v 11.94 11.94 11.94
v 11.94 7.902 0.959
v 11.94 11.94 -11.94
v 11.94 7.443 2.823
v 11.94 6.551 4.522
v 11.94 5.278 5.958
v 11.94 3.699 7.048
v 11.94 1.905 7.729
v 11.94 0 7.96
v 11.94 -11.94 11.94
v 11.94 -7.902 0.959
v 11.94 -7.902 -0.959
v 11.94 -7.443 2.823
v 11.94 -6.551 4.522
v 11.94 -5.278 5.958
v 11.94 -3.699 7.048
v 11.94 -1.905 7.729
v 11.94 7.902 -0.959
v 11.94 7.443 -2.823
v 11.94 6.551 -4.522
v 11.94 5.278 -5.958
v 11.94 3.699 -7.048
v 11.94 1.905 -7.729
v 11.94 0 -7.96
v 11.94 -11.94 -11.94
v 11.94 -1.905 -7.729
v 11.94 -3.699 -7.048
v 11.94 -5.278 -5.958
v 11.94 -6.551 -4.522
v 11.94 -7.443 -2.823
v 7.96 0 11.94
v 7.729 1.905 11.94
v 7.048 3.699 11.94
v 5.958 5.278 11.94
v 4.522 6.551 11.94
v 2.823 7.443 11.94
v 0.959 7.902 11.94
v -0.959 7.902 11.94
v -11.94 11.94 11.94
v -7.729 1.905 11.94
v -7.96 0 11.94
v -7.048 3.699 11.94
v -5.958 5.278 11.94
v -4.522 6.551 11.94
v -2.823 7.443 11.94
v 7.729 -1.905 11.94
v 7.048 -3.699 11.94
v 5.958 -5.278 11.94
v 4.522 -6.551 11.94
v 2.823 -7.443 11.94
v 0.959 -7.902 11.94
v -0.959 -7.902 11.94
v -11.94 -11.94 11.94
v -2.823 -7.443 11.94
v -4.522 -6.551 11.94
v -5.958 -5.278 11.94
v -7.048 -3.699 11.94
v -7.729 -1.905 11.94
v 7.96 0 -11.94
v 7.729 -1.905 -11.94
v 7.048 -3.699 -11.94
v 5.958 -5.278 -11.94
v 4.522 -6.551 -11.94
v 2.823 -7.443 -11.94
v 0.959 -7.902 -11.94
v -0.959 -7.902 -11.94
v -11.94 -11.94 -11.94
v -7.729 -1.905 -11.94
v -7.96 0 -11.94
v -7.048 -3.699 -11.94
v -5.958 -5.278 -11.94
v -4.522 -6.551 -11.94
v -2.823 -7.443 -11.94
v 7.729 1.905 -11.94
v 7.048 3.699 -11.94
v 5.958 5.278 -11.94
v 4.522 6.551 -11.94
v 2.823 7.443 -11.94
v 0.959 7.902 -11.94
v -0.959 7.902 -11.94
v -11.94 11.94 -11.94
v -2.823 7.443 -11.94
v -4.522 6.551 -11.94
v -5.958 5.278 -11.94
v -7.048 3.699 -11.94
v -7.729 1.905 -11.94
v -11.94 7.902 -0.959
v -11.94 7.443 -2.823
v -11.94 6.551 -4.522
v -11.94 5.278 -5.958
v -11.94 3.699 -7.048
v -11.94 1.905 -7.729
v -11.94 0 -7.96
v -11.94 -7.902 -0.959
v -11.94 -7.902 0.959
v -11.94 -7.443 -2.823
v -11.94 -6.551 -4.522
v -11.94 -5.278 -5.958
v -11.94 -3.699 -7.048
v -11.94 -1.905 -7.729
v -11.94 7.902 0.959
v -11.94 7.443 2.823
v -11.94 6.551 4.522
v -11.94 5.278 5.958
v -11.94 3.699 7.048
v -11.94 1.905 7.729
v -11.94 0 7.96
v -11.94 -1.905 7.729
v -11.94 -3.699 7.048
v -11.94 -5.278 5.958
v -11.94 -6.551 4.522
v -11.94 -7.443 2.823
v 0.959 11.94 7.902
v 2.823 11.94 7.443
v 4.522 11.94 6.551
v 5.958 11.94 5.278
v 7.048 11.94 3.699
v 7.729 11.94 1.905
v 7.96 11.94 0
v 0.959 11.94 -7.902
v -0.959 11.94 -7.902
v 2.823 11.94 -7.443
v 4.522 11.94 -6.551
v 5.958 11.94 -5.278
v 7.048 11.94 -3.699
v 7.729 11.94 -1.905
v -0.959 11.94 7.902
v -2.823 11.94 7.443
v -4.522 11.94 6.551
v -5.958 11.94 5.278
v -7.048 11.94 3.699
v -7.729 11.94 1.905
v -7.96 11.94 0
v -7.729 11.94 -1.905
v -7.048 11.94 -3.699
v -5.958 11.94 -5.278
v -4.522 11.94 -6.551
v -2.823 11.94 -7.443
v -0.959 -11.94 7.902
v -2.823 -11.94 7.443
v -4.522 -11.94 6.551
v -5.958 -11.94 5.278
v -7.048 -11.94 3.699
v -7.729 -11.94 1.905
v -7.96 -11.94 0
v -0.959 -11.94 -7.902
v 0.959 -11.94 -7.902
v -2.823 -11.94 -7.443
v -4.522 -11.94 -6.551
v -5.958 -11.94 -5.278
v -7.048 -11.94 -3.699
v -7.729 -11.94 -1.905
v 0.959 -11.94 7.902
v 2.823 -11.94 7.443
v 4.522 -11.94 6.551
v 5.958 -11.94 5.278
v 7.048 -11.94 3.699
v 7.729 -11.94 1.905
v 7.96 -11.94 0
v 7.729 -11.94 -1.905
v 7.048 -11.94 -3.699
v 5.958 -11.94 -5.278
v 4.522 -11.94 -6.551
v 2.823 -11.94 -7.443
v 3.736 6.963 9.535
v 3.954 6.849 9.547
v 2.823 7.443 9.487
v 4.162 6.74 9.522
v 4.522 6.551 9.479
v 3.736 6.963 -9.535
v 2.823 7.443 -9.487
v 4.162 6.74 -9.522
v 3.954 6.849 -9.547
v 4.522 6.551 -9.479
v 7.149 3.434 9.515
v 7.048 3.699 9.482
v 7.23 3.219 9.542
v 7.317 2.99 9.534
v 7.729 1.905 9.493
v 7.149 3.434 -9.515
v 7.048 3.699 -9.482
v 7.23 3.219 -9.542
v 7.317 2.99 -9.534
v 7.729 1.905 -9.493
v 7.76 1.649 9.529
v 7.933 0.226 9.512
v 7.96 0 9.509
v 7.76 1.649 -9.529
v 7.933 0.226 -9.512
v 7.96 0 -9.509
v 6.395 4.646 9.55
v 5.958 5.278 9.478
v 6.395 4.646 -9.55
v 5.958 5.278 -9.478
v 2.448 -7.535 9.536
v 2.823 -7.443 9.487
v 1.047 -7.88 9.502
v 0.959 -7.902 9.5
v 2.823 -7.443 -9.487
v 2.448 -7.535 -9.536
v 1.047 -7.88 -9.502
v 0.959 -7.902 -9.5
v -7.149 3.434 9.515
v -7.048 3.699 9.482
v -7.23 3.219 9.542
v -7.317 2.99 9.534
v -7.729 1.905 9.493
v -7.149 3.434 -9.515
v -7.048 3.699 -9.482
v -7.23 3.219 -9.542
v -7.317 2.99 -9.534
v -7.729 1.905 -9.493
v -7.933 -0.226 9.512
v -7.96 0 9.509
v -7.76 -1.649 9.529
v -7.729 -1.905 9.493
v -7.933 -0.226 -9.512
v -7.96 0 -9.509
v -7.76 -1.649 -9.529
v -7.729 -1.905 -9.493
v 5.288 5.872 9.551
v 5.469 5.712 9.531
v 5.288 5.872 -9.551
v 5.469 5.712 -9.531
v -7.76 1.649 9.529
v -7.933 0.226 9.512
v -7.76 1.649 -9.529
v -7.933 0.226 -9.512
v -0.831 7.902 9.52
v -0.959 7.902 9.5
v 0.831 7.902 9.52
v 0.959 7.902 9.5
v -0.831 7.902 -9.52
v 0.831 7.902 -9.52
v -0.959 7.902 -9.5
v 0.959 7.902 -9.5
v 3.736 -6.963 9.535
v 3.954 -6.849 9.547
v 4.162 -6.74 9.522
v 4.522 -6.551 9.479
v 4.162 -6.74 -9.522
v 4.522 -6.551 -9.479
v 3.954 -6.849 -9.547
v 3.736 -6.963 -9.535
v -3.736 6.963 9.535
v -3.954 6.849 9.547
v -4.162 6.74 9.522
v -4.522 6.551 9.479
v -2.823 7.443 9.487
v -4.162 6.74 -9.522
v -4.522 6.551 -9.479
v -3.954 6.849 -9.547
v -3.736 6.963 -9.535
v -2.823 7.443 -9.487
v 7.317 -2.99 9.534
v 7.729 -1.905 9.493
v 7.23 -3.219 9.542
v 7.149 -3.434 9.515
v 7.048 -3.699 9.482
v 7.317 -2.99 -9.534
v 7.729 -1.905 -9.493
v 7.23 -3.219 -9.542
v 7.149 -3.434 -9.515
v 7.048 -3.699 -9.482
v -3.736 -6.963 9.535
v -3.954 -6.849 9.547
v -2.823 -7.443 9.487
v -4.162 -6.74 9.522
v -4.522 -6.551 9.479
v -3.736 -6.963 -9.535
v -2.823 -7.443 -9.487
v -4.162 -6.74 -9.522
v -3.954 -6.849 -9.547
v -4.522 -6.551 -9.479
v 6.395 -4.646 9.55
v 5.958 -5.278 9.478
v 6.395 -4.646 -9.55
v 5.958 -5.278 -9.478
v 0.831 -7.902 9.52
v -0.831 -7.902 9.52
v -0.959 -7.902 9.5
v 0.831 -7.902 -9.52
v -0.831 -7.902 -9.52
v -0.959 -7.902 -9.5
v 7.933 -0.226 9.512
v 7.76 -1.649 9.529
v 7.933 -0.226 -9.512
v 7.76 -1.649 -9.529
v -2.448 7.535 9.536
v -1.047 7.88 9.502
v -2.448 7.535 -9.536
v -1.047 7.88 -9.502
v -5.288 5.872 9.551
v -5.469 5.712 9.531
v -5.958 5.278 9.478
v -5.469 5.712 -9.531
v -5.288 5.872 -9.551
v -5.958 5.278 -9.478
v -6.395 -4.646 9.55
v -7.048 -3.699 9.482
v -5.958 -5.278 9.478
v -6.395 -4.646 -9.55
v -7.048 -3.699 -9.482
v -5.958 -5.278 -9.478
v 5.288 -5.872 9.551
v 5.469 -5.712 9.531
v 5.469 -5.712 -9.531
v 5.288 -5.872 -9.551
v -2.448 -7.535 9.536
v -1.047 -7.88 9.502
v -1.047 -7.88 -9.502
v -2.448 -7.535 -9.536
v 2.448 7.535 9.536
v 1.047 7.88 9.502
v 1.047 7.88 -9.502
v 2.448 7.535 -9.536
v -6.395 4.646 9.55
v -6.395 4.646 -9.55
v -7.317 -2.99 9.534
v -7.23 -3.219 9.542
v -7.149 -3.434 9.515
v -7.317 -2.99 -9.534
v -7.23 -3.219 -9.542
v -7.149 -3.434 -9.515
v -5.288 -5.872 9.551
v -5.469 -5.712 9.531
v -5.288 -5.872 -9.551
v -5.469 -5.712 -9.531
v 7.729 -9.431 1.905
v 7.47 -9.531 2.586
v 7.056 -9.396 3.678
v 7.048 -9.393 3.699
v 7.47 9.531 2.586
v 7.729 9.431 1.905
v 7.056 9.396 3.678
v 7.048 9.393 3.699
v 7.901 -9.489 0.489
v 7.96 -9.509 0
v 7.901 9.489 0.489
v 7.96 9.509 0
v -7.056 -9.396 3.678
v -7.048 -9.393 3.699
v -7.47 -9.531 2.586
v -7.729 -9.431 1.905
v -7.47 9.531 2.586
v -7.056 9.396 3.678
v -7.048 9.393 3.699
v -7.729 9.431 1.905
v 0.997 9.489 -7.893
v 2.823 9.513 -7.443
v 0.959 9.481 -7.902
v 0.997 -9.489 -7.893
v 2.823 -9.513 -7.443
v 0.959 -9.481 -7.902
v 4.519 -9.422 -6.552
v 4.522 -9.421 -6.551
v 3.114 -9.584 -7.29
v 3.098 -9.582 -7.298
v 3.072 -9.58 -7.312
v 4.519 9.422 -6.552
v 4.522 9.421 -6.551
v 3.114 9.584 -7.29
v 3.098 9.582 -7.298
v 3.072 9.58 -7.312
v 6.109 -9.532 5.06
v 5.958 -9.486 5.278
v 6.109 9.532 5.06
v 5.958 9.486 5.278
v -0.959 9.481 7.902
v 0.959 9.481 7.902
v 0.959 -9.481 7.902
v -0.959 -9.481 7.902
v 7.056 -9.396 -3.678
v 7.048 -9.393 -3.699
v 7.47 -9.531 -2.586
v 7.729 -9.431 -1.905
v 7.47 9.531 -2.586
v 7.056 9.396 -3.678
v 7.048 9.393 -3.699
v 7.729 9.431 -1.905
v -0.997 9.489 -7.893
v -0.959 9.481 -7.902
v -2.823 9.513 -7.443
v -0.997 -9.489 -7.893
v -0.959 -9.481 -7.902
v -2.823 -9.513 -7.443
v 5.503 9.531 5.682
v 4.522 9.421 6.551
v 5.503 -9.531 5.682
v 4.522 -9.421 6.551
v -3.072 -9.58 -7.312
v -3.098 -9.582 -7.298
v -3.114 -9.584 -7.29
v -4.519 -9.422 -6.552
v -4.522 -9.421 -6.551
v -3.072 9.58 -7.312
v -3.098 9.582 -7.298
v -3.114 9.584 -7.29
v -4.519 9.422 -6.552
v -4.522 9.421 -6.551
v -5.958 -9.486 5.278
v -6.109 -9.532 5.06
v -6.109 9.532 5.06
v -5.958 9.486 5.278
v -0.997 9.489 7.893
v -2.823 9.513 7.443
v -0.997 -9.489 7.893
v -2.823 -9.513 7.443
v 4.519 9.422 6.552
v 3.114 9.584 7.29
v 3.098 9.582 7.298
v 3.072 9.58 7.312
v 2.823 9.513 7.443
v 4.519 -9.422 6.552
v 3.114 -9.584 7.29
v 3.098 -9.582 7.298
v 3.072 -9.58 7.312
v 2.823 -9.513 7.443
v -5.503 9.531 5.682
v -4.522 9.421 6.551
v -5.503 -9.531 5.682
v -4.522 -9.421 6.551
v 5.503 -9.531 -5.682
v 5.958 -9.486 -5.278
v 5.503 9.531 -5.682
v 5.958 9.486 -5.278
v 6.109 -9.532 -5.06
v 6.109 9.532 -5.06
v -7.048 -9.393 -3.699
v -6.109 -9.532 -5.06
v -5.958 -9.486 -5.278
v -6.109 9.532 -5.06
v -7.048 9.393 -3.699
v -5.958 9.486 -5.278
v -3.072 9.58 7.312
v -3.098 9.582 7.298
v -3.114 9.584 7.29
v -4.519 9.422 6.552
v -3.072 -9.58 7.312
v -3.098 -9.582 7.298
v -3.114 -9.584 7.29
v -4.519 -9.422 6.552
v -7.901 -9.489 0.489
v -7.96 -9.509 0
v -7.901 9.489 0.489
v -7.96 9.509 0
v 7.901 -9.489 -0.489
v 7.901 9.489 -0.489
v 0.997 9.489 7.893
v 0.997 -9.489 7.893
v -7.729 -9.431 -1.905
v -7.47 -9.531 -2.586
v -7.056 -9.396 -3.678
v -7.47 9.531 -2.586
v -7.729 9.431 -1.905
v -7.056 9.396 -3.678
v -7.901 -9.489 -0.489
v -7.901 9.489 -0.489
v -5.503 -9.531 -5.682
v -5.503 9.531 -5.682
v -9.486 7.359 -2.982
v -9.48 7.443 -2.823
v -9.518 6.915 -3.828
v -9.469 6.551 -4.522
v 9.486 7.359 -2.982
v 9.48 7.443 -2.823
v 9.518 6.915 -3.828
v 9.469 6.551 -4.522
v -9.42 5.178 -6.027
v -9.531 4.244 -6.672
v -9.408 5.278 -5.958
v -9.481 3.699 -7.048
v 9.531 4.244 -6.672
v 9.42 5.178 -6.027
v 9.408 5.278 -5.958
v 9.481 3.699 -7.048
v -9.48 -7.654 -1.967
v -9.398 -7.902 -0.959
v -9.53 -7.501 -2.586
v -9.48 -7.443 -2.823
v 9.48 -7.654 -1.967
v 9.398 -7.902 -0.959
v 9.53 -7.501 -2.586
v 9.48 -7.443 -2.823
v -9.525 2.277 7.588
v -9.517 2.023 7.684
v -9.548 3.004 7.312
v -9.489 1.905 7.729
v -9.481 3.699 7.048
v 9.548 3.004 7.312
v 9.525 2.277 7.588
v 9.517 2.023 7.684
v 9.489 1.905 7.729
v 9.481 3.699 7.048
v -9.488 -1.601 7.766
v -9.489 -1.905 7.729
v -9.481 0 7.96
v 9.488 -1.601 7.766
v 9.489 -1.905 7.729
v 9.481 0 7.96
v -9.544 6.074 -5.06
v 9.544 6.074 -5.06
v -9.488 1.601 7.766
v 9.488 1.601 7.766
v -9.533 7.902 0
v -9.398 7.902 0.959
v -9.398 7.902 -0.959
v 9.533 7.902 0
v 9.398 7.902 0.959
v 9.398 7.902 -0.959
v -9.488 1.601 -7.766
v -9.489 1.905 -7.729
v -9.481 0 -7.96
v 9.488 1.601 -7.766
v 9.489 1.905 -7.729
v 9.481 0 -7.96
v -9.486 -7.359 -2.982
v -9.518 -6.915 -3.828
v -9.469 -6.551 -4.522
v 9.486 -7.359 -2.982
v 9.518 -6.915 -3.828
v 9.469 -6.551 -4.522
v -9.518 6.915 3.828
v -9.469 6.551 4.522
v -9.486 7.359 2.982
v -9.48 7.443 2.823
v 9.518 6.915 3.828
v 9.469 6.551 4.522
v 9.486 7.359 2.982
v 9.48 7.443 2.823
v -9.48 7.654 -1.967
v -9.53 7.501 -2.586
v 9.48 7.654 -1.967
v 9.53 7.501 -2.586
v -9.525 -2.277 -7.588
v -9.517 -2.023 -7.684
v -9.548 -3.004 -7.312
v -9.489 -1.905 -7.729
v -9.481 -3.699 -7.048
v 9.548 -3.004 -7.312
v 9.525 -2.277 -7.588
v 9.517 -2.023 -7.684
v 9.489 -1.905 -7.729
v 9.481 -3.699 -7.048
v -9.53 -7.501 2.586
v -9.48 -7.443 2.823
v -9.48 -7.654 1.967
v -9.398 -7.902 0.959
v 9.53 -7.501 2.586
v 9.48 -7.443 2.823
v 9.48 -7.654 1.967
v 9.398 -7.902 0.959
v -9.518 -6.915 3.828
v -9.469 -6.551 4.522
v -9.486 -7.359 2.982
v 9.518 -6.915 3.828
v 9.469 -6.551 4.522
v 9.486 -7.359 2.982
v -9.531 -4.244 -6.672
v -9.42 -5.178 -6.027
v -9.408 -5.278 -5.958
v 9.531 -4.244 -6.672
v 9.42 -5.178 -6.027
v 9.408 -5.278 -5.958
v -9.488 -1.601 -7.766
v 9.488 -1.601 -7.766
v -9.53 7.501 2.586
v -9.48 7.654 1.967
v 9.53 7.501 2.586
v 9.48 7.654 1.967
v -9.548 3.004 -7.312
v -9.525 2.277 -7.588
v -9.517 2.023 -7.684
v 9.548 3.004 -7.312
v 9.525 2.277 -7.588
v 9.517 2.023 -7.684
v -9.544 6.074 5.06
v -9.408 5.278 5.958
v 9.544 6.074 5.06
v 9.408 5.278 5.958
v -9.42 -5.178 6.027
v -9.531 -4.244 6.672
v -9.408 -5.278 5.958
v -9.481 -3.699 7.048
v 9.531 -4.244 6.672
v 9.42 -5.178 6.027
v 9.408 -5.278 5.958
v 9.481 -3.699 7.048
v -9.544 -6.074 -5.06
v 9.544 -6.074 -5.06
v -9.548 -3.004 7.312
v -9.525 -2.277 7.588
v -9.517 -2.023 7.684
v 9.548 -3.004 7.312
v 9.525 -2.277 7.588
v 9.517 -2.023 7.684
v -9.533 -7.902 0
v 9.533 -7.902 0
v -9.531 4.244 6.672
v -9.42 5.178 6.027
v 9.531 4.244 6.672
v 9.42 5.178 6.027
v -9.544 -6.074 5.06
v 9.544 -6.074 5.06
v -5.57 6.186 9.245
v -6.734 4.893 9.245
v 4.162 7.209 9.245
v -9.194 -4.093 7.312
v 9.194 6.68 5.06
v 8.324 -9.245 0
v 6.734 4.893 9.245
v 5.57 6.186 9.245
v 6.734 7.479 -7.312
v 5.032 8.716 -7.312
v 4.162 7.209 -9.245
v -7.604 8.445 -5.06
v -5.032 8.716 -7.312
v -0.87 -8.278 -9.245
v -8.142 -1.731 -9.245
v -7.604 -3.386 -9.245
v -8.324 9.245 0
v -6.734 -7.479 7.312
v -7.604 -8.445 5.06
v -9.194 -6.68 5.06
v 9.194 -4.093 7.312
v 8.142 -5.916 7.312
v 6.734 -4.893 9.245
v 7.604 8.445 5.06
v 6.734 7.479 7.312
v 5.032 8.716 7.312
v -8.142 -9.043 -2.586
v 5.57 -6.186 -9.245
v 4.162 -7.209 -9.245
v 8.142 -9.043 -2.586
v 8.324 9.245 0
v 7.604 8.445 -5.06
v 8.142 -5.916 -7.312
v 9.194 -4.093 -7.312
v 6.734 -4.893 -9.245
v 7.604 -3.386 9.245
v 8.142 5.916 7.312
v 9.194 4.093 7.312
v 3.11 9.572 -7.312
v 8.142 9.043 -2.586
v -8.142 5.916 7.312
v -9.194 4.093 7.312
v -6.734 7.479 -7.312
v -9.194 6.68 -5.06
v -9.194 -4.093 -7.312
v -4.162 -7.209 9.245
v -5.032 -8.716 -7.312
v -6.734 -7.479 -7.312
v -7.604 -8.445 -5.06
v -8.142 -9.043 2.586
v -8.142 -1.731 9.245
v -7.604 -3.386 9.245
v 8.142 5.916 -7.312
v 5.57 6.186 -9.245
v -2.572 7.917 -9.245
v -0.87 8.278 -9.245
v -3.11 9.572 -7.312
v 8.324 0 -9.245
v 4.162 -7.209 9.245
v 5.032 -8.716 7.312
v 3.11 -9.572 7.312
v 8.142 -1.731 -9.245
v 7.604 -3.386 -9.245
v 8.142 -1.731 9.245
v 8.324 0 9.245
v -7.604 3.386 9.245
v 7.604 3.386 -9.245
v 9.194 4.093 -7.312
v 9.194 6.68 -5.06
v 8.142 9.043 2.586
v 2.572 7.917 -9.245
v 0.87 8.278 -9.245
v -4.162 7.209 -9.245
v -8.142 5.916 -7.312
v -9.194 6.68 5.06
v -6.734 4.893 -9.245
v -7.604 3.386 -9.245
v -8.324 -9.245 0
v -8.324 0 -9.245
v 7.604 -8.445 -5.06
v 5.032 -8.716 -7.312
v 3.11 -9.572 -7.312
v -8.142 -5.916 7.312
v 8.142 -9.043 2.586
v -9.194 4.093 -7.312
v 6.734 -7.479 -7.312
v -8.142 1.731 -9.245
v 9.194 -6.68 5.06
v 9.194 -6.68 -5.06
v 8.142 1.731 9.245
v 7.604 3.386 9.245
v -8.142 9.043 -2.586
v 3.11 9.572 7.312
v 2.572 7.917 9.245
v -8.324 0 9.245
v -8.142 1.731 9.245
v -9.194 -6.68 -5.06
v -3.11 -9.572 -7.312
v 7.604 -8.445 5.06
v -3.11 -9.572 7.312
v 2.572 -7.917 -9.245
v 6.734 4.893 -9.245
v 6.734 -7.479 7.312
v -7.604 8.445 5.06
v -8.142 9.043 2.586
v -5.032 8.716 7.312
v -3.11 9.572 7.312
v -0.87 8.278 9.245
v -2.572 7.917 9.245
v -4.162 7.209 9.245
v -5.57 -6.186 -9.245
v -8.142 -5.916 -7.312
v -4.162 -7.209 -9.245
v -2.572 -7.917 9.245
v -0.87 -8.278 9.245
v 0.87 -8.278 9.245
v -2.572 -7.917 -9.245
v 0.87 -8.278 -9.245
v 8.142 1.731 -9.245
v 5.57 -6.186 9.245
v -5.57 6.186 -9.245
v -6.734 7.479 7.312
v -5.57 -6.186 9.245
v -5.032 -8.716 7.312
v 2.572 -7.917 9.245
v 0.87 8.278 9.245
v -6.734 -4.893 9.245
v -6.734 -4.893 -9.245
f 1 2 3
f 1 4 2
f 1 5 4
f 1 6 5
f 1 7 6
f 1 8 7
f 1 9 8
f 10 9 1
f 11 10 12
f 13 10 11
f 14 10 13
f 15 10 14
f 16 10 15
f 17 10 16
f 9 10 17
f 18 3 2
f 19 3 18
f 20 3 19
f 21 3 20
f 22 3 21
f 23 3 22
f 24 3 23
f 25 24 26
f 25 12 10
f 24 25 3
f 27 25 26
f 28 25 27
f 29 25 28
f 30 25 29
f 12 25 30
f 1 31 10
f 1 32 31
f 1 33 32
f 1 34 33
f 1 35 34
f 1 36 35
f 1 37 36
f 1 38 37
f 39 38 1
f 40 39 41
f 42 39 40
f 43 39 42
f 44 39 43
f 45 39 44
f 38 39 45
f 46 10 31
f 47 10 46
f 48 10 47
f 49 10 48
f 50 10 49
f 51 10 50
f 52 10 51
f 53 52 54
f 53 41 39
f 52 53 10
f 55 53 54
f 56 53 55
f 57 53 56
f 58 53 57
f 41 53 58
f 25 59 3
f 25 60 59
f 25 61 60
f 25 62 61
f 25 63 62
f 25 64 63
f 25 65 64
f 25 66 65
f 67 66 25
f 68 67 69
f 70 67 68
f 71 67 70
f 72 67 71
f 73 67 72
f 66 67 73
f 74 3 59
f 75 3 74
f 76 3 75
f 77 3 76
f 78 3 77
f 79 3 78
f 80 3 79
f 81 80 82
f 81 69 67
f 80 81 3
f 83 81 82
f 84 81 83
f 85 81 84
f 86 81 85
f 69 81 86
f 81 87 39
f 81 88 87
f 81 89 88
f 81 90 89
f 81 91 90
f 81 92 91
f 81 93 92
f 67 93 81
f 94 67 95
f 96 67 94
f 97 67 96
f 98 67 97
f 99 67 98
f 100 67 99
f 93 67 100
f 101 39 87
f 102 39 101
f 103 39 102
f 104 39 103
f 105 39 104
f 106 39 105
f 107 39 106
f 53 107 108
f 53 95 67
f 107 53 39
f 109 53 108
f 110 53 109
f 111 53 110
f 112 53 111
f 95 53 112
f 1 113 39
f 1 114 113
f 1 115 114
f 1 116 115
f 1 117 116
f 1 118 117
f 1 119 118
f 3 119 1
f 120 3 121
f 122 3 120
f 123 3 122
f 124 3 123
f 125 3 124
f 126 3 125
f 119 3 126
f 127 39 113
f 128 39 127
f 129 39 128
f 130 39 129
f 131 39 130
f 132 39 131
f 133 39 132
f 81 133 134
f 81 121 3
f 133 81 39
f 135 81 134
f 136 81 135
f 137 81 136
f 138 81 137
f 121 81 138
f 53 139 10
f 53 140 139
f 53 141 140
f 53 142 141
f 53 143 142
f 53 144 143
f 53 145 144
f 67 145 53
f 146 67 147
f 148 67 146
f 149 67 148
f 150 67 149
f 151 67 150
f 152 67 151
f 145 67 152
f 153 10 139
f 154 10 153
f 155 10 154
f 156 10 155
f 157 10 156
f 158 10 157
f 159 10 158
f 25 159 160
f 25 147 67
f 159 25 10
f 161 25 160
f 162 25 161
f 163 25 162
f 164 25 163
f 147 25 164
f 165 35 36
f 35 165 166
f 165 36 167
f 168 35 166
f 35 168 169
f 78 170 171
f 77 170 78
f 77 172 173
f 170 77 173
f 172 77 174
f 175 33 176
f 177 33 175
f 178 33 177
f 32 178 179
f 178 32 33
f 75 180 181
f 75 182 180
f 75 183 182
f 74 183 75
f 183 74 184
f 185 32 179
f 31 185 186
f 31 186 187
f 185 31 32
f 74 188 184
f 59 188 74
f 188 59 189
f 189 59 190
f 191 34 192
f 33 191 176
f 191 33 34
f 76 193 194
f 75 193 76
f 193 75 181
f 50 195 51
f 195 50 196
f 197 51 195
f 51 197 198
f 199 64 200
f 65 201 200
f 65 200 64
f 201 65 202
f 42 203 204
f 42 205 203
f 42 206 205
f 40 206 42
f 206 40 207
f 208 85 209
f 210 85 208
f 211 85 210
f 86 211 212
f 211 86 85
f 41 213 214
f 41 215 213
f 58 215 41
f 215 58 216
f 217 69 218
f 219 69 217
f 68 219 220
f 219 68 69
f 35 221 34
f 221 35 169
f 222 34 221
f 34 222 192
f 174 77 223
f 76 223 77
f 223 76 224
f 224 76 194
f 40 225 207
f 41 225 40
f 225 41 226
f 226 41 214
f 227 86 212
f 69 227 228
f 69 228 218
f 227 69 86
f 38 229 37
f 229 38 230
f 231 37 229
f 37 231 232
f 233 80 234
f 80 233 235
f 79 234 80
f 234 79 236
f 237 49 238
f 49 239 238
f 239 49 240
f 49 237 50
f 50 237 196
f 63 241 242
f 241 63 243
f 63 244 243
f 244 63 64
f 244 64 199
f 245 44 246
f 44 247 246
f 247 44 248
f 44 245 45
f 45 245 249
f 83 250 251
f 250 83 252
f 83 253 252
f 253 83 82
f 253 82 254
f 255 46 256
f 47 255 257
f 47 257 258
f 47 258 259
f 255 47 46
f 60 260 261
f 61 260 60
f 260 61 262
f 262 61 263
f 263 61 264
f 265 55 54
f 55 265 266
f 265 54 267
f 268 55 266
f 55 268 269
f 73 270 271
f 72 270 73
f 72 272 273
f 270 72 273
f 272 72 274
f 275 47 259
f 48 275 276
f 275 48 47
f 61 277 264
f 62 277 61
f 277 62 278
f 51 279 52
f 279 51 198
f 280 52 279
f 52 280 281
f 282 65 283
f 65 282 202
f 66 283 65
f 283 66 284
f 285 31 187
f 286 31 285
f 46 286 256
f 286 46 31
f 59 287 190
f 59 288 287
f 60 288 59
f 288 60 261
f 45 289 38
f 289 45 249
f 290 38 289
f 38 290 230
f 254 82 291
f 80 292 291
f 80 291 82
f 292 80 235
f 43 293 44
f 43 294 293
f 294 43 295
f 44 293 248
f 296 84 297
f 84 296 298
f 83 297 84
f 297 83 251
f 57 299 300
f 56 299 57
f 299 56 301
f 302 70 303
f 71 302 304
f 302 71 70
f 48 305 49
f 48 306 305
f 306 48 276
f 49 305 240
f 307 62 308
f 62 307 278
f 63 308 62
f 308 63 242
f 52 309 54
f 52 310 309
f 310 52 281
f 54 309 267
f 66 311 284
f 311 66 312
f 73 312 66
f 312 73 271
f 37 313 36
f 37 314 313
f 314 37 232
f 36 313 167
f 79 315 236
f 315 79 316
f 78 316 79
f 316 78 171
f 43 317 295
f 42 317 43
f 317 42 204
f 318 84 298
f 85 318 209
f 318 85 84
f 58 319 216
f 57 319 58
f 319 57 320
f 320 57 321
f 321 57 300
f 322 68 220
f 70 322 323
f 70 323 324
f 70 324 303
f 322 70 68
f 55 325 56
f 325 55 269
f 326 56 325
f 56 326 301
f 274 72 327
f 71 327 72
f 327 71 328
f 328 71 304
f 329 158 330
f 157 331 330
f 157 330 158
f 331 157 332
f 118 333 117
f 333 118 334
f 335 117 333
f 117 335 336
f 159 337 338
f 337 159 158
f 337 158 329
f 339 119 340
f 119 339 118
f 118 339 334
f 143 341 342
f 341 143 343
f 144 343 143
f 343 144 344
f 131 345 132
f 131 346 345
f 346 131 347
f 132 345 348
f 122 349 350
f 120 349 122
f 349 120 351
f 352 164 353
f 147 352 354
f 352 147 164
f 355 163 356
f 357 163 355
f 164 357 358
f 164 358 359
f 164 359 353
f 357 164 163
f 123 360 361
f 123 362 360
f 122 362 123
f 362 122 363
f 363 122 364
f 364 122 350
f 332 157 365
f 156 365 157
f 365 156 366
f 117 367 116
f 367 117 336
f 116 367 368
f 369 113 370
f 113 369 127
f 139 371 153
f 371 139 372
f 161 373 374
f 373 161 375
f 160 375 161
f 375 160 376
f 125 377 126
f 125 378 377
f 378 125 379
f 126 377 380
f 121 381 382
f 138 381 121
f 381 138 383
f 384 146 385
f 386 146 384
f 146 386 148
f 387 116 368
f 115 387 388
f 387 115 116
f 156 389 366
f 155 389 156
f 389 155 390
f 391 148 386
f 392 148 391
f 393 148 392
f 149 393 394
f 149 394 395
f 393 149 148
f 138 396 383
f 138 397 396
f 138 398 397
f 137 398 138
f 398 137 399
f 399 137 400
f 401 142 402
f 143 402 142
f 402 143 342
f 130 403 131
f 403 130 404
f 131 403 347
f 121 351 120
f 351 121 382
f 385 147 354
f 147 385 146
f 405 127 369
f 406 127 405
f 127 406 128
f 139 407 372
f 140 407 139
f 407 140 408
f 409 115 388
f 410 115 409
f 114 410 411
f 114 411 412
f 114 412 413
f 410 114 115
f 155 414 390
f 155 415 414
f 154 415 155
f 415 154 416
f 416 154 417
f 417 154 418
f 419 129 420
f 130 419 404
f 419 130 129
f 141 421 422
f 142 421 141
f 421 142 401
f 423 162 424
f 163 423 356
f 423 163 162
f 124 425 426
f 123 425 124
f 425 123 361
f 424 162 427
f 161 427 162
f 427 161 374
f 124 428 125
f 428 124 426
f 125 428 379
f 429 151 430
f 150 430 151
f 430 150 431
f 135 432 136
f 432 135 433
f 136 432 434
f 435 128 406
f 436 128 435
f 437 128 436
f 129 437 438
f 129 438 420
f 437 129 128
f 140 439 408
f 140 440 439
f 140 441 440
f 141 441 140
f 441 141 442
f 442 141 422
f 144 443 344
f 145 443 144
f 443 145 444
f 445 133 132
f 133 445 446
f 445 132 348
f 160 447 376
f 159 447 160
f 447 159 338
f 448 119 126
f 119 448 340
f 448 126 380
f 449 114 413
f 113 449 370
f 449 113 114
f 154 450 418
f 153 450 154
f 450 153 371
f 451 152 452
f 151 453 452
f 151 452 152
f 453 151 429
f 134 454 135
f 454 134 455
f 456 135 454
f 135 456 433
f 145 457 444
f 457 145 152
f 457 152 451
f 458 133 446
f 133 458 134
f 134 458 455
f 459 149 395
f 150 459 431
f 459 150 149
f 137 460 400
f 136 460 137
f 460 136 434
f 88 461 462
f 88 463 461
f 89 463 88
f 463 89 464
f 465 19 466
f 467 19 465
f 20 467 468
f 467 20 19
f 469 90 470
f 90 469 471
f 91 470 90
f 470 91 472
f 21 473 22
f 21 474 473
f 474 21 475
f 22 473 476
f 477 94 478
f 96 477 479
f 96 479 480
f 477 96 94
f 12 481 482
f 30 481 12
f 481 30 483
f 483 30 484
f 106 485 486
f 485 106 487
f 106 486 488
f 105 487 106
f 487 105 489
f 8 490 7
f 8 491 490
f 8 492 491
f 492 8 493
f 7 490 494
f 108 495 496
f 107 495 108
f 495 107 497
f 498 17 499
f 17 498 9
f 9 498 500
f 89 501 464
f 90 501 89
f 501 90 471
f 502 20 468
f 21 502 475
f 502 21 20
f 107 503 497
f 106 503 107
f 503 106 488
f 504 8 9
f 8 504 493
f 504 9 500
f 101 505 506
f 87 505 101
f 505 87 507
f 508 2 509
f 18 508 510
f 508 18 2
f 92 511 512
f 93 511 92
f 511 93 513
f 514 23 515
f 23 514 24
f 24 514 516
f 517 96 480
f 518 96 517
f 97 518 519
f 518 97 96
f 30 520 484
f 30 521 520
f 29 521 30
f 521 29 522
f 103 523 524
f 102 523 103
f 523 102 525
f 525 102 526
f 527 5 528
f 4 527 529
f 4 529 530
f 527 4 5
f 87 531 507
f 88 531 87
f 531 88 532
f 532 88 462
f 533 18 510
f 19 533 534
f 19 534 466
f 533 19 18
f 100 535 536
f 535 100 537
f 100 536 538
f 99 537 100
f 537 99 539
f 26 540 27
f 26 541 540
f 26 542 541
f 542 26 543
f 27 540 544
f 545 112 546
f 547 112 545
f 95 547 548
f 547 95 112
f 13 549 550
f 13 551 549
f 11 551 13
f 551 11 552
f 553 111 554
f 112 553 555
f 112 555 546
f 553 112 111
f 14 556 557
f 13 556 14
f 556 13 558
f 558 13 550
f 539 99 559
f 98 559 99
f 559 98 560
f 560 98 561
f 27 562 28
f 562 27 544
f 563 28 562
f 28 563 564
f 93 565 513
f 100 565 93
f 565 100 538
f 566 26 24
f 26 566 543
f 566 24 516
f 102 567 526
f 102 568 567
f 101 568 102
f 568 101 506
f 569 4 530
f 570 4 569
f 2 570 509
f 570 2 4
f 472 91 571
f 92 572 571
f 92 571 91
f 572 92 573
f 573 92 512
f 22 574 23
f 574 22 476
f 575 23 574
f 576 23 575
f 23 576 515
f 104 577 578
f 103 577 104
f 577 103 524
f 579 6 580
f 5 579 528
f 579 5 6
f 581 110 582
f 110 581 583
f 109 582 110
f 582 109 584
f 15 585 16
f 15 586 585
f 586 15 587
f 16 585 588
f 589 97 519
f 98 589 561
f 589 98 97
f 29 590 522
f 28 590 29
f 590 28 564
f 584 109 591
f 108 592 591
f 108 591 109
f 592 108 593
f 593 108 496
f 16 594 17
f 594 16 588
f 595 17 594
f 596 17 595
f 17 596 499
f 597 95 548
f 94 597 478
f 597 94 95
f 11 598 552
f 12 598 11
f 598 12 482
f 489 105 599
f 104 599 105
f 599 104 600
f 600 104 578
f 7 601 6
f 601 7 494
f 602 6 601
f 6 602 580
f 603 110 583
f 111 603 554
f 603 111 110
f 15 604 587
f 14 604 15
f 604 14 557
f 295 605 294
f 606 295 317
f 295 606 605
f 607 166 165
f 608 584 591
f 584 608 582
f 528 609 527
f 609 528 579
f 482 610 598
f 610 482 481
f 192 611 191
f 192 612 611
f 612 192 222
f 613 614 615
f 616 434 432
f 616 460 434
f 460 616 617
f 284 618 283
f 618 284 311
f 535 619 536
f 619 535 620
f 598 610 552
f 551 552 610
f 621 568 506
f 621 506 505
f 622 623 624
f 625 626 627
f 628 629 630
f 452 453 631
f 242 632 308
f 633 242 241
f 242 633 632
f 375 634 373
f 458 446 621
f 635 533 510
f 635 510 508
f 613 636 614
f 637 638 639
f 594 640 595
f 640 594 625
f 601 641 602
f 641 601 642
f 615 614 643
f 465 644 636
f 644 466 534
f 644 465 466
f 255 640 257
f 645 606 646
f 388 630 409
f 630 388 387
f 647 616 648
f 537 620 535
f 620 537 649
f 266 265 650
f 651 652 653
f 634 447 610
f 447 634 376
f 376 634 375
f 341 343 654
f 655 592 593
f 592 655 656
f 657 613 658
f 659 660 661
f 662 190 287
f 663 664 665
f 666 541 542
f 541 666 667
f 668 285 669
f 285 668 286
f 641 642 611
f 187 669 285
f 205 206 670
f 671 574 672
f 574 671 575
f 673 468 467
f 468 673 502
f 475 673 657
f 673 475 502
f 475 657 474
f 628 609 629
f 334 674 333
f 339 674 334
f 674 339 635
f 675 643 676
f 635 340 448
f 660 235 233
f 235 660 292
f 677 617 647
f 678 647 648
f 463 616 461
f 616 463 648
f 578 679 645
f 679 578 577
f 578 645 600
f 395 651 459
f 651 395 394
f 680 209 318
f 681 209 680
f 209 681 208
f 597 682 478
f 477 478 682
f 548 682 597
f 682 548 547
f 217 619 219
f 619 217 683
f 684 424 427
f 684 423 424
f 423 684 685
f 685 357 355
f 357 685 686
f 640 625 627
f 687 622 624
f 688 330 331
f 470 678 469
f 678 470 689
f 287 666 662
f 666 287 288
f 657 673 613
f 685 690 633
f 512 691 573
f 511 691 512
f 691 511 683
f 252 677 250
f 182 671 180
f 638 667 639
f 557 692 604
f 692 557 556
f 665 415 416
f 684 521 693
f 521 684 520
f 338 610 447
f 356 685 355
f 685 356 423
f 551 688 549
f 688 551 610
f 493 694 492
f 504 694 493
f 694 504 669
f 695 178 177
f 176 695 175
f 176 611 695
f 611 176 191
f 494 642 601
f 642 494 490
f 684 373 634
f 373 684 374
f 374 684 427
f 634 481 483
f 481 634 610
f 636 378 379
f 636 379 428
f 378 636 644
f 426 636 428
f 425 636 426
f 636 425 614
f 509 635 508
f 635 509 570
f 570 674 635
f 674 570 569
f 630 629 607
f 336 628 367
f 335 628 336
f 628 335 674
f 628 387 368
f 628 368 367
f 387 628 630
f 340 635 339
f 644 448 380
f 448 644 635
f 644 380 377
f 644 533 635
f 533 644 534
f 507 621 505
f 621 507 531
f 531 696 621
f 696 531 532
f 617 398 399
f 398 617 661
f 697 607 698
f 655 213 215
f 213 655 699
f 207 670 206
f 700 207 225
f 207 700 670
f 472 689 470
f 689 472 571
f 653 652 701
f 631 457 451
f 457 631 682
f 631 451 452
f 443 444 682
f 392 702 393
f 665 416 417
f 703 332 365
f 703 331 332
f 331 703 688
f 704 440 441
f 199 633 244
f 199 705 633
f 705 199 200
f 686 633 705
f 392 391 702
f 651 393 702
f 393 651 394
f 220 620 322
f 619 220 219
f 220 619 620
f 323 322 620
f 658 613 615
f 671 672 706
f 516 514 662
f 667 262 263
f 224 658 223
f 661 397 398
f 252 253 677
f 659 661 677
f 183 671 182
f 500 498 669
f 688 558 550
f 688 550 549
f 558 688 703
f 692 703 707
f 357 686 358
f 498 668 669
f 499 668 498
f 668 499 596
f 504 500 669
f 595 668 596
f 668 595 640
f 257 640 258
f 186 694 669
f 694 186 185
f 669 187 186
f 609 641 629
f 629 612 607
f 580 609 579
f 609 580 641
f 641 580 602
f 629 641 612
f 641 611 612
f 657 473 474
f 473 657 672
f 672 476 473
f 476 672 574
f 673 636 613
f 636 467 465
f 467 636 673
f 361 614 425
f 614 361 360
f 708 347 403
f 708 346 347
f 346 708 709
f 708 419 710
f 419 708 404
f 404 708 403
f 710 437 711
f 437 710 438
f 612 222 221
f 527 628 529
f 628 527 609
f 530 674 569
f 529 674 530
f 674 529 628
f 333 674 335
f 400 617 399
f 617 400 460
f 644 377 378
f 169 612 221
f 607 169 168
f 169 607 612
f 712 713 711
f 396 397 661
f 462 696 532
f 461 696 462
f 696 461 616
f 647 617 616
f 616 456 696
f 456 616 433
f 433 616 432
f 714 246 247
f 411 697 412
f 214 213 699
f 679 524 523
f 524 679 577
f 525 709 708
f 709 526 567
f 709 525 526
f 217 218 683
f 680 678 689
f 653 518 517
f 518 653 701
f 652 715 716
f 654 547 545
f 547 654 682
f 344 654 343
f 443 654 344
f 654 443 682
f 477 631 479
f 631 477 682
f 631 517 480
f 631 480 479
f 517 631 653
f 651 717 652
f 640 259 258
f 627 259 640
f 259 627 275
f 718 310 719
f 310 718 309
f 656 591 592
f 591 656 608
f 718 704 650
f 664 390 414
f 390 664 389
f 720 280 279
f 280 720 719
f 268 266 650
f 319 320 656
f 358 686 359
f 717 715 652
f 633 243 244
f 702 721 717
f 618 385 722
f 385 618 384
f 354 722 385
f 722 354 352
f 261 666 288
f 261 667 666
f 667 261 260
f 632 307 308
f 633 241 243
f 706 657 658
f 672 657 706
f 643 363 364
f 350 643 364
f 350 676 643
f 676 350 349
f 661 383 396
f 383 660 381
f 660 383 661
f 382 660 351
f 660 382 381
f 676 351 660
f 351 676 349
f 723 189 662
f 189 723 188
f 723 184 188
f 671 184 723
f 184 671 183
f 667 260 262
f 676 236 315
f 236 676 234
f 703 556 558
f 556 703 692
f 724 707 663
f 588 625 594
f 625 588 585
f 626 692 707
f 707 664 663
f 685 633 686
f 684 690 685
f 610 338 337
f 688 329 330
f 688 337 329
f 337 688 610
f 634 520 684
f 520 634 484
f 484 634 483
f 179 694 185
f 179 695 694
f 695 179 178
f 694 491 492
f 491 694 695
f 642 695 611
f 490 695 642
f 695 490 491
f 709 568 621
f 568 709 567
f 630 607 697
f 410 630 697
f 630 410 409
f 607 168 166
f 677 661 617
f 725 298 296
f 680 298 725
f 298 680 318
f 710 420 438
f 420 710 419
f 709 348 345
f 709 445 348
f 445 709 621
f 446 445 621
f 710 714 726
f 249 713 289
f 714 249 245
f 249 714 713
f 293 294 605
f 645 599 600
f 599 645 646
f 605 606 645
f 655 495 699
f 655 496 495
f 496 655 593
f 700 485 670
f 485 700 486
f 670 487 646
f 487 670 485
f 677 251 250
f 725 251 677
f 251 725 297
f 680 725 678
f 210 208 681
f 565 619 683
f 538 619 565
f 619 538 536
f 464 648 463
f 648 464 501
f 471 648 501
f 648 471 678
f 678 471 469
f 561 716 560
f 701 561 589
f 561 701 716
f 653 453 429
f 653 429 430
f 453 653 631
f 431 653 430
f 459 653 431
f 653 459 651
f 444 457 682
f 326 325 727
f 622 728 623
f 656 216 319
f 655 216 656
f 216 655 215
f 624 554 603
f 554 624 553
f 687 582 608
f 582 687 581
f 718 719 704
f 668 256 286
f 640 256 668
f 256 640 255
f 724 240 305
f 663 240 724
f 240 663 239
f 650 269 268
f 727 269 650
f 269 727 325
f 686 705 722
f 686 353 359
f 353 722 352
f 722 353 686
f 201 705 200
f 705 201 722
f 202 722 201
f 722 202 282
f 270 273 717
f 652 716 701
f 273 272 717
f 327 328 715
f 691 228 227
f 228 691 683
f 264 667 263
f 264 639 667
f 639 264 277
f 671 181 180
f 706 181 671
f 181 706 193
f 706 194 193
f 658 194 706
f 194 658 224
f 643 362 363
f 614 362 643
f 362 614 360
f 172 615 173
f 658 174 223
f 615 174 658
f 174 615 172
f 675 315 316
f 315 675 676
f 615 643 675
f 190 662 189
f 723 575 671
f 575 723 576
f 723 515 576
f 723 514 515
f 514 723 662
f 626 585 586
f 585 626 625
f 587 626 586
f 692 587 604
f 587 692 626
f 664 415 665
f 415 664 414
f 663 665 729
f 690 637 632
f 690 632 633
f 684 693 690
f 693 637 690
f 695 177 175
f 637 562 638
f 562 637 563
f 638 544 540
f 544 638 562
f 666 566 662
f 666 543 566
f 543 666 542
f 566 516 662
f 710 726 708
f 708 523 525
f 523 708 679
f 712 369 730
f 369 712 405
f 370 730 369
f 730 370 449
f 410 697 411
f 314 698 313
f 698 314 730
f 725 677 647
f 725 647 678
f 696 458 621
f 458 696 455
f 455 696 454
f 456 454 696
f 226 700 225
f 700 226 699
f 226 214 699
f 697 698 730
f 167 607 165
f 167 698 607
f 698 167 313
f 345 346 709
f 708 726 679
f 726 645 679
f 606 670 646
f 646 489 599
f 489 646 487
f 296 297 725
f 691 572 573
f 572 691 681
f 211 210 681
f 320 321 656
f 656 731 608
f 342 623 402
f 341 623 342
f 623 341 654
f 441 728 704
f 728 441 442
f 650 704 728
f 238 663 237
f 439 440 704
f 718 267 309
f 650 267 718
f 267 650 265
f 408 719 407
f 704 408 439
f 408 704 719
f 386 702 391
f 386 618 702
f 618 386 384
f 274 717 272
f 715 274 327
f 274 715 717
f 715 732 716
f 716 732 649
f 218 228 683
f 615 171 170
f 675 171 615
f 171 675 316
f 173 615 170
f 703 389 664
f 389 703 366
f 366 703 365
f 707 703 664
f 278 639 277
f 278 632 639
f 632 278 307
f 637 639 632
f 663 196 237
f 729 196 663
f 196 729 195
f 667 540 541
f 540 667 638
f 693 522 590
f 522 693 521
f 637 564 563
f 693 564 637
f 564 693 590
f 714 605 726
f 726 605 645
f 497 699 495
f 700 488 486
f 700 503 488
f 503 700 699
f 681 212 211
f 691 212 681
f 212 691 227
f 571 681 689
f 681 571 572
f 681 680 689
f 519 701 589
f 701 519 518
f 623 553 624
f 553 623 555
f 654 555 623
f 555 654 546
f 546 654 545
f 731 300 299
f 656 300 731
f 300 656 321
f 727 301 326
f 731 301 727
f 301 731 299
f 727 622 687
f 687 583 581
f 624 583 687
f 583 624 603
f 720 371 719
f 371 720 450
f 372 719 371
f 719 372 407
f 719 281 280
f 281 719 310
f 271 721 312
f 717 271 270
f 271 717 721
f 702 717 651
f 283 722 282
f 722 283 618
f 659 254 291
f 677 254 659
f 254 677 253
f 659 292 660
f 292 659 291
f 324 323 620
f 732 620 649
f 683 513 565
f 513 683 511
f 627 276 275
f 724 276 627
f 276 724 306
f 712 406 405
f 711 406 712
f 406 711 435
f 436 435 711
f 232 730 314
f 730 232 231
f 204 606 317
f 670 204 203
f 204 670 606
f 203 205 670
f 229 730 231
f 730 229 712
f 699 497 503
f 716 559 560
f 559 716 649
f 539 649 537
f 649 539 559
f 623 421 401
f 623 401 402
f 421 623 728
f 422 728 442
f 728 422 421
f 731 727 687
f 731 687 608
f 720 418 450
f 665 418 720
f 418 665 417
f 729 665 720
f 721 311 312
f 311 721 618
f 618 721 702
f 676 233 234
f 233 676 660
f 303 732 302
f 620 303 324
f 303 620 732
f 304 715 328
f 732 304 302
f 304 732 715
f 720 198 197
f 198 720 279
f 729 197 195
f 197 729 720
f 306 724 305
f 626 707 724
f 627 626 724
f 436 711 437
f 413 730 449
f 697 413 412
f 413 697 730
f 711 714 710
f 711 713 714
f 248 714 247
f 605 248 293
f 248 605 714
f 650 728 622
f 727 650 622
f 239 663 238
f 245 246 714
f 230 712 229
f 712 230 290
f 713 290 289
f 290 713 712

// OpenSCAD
//Coin trap: a 3D printed cage to hold a coin
//by Matt
//v. 0.1, 16 Nov 2018
//v. 0.2, 19 Nov 2018

//parameters
coin_d = 23.88; //diameter of a quarter
coin_th = 1.58; // thickness of a quarter
gap=1;

//the coin
%cylinder(r=coin_d/2, h=coin_th, center = true);

//the trap


difference() {
cube(size=coin_d, center = true);
cylinder(r=coin_d/3, h= coin_d*1.5, center=true);
rotate([90,0,0]) { 
cylinder(r=coin_d/3, h= coin_d*1.5, center=true);
}
rotate([0,90,0]) { 
cylinder(r=coin_d/3, h= coin_d*1.5, center=true);
}
sphere(d=coin_d+gap);
}
